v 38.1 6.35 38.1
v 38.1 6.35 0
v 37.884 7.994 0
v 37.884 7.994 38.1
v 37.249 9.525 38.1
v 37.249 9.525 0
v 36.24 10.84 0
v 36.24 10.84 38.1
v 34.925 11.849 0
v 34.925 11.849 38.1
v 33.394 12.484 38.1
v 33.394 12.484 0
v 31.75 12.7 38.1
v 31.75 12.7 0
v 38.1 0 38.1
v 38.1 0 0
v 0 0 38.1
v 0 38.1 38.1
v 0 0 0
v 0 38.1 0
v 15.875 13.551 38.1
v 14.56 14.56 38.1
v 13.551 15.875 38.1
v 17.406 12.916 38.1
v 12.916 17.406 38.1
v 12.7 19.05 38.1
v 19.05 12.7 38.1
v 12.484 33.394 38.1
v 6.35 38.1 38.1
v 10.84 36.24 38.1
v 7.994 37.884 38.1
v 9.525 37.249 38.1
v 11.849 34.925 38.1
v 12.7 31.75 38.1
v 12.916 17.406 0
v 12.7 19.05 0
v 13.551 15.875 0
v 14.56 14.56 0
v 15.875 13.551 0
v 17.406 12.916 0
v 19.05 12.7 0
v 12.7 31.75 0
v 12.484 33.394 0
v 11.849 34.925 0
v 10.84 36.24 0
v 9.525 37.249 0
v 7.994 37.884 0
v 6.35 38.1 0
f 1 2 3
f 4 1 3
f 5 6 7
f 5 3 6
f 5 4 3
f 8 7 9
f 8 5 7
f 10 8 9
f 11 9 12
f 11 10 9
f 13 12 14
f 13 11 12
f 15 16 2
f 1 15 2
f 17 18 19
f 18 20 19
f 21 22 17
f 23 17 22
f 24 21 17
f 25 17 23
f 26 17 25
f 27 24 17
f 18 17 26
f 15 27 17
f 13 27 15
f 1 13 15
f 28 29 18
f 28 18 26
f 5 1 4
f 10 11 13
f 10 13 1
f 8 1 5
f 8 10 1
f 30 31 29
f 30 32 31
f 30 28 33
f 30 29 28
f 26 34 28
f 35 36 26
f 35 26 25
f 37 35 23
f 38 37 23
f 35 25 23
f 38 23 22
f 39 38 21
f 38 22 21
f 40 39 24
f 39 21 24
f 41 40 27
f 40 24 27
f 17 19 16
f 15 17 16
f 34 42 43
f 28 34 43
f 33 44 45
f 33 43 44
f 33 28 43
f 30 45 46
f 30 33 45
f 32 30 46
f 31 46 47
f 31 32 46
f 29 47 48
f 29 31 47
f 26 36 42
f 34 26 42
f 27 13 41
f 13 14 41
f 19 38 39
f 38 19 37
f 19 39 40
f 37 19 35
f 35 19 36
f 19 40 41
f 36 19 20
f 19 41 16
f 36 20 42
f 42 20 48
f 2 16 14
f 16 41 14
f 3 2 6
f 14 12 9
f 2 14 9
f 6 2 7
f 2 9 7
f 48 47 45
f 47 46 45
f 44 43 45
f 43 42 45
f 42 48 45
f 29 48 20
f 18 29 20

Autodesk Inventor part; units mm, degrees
ref_plane "YZ Plane" through (0, 0, 0) normal (1, 0, 0) x (0, 1, 0)
ref_plane "XZ Plane" through (0, 0, 0) normal (0, 1, 0) x (-1, 0, 0)
ref_plane "XY Plane" through (0, 0, 0) normal (0, 0, 1) x (1, 0, 0)
sketch "Sketch1" plane through (0, 0, 0) normal (0, 0, 1) x (1, 0, 0)
  line L0 (0, 0) -> (38.1, 0)
  line L1 (38.1, 0) -> (38.1, 12.7)
  line L2 (38.1, 12.7) -> (12.7, 12.7)
  line L3 (12.7, 12.7) -> (12.7, 38.1)
  line L4 (12.7, 38.1) -> (0, 38.1)
  line L5 (0, 38.1) -> (0, 0)
  dimension "d0" = 38.1
  dimension "d1" = 12.7
  dimension "d2" = 25.4
  dimension "d3" = 25.4
extrude "Extrusion1" add sketch "Sketch1" along normal blind 38.1
fillet "Fillet1" radius 6.35 1 edges at (12.7, 38.1, 19.05)
fillet "Fillet2" radius 6.35 2 edges at (12.7, 12.7, 19.05) (38.1, 12.7, 19.05)
properties part number "Fillet"
